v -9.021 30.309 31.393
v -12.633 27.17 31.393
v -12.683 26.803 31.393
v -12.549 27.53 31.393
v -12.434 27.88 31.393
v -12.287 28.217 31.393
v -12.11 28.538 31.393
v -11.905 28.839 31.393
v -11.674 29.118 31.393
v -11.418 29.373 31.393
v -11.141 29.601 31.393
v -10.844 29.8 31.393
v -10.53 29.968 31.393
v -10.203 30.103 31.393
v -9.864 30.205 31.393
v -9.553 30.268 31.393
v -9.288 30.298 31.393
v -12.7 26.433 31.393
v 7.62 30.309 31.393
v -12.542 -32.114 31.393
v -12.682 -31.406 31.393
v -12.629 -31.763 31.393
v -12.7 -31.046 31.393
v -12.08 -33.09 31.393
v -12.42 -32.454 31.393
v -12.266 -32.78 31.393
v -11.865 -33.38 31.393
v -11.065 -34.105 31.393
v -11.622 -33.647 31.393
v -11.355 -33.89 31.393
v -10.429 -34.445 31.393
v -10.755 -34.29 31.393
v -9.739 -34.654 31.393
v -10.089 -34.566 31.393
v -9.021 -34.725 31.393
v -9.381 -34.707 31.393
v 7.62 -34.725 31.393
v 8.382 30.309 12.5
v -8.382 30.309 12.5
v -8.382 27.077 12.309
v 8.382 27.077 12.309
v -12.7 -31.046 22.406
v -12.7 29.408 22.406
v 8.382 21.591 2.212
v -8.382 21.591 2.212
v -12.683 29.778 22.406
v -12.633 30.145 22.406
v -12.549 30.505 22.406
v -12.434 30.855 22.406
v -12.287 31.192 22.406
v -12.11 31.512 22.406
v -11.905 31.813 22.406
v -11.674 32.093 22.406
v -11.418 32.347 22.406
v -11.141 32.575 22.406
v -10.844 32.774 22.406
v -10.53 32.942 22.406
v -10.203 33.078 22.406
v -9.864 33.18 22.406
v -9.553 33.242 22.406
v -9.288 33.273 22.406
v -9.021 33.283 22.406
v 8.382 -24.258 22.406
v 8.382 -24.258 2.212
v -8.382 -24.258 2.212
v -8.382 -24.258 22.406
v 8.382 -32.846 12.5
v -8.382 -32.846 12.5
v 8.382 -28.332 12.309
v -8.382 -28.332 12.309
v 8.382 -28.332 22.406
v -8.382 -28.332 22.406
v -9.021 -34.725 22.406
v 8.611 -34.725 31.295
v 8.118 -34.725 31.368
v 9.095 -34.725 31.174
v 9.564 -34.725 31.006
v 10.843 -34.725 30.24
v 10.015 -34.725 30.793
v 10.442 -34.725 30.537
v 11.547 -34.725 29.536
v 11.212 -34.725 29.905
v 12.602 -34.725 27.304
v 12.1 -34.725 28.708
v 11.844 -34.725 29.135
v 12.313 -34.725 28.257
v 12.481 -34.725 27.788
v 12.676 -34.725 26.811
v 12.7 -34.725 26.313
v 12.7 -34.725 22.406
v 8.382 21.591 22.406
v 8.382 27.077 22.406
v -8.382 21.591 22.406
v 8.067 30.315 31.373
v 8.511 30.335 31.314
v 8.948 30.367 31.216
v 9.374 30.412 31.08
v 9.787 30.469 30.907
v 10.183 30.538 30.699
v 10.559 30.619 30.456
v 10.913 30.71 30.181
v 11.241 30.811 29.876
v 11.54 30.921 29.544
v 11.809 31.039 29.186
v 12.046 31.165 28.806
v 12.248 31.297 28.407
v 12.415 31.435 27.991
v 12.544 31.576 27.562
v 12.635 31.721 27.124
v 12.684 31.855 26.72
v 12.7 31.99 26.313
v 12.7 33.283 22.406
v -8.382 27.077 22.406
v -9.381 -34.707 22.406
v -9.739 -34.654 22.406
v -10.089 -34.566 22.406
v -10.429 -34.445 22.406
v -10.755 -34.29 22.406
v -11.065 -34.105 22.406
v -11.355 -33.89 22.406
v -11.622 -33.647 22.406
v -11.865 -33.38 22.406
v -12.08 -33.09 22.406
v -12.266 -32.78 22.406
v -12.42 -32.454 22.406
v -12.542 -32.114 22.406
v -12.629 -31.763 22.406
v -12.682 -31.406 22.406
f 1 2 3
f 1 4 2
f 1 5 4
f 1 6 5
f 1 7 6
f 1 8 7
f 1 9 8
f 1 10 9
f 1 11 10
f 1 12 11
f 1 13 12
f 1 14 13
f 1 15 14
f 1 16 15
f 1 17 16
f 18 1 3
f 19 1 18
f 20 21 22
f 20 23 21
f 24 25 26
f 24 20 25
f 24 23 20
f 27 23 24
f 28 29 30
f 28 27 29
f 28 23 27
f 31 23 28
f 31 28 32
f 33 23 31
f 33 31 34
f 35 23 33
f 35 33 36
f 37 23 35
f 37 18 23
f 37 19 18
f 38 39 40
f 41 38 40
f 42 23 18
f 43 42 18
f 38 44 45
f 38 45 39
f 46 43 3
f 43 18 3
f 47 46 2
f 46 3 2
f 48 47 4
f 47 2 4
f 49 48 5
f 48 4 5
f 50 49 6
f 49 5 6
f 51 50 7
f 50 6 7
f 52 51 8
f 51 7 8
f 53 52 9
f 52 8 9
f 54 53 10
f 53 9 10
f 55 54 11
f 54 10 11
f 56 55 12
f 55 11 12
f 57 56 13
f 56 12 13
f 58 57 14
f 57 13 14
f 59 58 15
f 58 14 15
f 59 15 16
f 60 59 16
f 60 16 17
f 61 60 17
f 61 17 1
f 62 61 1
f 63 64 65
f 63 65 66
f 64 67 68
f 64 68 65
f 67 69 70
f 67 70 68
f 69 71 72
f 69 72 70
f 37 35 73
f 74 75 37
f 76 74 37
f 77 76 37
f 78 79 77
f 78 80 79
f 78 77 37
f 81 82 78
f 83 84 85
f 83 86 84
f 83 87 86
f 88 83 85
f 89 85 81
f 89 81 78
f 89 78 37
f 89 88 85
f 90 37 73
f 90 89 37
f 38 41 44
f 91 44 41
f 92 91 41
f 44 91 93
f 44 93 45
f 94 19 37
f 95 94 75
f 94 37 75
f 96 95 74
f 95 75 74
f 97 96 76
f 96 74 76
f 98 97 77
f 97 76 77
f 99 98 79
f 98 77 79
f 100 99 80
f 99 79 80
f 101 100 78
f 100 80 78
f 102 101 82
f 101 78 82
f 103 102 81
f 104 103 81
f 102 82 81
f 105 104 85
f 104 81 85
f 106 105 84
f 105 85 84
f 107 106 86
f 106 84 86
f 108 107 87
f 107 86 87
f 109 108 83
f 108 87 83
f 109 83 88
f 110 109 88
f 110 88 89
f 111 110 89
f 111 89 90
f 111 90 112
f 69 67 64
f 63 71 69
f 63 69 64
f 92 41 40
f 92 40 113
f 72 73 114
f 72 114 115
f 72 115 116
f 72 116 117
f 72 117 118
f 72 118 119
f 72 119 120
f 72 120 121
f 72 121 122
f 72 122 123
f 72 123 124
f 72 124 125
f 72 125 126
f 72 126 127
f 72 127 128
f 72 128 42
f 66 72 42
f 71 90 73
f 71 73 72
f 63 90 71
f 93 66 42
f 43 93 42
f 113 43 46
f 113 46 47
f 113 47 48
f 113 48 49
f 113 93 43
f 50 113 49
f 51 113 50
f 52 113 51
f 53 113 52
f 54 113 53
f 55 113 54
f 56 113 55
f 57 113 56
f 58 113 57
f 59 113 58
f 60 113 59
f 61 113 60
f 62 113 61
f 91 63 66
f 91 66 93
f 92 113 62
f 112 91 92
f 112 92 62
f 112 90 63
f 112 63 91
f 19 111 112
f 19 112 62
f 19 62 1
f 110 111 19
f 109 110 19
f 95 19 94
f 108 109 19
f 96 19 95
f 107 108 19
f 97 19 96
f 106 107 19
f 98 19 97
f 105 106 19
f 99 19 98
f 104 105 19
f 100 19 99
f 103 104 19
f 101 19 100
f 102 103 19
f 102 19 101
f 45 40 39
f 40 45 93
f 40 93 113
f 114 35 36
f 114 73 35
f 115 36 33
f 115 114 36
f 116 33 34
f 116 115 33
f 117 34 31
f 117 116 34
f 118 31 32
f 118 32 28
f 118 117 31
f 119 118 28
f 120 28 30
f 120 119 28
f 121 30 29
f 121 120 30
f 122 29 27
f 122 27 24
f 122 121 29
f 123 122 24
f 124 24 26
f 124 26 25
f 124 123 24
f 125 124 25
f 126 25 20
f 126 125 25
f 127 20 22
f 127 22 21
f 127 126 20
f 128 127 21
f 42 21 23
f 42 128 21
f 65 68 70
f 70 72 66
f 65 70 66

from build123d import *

# Parameters (mm, degrees)
F1_DEPTH = 12.7
F2_DEPTH = 8.382
F3_R     = 3.679261
F4_R     = 5.08


with BuildPart() as f1:
    # F0 (on Right) → F1 (new body, symmetric)
    with BuildSketch(Plane.YZ):
        Polygon((30.308623, 31.392861), (-34.372479, 31.392861), (-34.724846, 31.392861), (-34.724846, 22.405792), (-28.332443, 22.405792), (-24.258062, 22.405792), (-20.550046, 22.405792), (-9.070974, 22.405792), (1.610943, 22.405792), (21.591455, 22.405792), (27.077377, 22.405792), (33.283076, 22.405792), align=None)
    extrude(amount=F1_DEPTH, both=True)

    # F0 (on Right) → F2 (join, symmetric)
    with BuildSketch(Plane.YZ):
        Polygon((30.308623, 31.392861), (-34.372479, 31.392861), (-34.724846, 31.392861), (-34.724846, 22.405792), (-28.332443, 22.405792), (-24.258062, 22.405792), (-20.550046, 22.405792), (-9.070974, 22.405792), (1.610943, 22.405792), (21.591455, 22.405792), (27.077377, 22.405792), (33.283076, 22.405792), align=None)
        Polygon((27.077377, 12.309055), (27.077377, 22.405792), (21.591455, 22.405792), (21.591455, 2.212318), (30.308623, 12.499893), align=None)
        Polygon((-24.258062, 22.405792), (-28.332443, 22.405792), (-28.332443, 12.309055), (-32.845773, 12.499893), (-24.258062, 2.212318), align=None)
    extrude(amount=F2_DEPTH, both=True)

    # F3
    f3_edges = [f1.edges().sort_by_distance(p)[0] for p in [
        (-12.7, -34.724846, 26.899327),
        (-12.7, 31.795849, 26.899327),
    ]]
    fillet(f3_edges, radius=F3_R)

    # F4
    f4_edges = [f1.edges().sort_by_distance(p)[0] for p in [
        (12.7, -2.208112, 31.392861),
    ]]
    fillet(f4_edges, radius=F4_R)


solid = f1.part
